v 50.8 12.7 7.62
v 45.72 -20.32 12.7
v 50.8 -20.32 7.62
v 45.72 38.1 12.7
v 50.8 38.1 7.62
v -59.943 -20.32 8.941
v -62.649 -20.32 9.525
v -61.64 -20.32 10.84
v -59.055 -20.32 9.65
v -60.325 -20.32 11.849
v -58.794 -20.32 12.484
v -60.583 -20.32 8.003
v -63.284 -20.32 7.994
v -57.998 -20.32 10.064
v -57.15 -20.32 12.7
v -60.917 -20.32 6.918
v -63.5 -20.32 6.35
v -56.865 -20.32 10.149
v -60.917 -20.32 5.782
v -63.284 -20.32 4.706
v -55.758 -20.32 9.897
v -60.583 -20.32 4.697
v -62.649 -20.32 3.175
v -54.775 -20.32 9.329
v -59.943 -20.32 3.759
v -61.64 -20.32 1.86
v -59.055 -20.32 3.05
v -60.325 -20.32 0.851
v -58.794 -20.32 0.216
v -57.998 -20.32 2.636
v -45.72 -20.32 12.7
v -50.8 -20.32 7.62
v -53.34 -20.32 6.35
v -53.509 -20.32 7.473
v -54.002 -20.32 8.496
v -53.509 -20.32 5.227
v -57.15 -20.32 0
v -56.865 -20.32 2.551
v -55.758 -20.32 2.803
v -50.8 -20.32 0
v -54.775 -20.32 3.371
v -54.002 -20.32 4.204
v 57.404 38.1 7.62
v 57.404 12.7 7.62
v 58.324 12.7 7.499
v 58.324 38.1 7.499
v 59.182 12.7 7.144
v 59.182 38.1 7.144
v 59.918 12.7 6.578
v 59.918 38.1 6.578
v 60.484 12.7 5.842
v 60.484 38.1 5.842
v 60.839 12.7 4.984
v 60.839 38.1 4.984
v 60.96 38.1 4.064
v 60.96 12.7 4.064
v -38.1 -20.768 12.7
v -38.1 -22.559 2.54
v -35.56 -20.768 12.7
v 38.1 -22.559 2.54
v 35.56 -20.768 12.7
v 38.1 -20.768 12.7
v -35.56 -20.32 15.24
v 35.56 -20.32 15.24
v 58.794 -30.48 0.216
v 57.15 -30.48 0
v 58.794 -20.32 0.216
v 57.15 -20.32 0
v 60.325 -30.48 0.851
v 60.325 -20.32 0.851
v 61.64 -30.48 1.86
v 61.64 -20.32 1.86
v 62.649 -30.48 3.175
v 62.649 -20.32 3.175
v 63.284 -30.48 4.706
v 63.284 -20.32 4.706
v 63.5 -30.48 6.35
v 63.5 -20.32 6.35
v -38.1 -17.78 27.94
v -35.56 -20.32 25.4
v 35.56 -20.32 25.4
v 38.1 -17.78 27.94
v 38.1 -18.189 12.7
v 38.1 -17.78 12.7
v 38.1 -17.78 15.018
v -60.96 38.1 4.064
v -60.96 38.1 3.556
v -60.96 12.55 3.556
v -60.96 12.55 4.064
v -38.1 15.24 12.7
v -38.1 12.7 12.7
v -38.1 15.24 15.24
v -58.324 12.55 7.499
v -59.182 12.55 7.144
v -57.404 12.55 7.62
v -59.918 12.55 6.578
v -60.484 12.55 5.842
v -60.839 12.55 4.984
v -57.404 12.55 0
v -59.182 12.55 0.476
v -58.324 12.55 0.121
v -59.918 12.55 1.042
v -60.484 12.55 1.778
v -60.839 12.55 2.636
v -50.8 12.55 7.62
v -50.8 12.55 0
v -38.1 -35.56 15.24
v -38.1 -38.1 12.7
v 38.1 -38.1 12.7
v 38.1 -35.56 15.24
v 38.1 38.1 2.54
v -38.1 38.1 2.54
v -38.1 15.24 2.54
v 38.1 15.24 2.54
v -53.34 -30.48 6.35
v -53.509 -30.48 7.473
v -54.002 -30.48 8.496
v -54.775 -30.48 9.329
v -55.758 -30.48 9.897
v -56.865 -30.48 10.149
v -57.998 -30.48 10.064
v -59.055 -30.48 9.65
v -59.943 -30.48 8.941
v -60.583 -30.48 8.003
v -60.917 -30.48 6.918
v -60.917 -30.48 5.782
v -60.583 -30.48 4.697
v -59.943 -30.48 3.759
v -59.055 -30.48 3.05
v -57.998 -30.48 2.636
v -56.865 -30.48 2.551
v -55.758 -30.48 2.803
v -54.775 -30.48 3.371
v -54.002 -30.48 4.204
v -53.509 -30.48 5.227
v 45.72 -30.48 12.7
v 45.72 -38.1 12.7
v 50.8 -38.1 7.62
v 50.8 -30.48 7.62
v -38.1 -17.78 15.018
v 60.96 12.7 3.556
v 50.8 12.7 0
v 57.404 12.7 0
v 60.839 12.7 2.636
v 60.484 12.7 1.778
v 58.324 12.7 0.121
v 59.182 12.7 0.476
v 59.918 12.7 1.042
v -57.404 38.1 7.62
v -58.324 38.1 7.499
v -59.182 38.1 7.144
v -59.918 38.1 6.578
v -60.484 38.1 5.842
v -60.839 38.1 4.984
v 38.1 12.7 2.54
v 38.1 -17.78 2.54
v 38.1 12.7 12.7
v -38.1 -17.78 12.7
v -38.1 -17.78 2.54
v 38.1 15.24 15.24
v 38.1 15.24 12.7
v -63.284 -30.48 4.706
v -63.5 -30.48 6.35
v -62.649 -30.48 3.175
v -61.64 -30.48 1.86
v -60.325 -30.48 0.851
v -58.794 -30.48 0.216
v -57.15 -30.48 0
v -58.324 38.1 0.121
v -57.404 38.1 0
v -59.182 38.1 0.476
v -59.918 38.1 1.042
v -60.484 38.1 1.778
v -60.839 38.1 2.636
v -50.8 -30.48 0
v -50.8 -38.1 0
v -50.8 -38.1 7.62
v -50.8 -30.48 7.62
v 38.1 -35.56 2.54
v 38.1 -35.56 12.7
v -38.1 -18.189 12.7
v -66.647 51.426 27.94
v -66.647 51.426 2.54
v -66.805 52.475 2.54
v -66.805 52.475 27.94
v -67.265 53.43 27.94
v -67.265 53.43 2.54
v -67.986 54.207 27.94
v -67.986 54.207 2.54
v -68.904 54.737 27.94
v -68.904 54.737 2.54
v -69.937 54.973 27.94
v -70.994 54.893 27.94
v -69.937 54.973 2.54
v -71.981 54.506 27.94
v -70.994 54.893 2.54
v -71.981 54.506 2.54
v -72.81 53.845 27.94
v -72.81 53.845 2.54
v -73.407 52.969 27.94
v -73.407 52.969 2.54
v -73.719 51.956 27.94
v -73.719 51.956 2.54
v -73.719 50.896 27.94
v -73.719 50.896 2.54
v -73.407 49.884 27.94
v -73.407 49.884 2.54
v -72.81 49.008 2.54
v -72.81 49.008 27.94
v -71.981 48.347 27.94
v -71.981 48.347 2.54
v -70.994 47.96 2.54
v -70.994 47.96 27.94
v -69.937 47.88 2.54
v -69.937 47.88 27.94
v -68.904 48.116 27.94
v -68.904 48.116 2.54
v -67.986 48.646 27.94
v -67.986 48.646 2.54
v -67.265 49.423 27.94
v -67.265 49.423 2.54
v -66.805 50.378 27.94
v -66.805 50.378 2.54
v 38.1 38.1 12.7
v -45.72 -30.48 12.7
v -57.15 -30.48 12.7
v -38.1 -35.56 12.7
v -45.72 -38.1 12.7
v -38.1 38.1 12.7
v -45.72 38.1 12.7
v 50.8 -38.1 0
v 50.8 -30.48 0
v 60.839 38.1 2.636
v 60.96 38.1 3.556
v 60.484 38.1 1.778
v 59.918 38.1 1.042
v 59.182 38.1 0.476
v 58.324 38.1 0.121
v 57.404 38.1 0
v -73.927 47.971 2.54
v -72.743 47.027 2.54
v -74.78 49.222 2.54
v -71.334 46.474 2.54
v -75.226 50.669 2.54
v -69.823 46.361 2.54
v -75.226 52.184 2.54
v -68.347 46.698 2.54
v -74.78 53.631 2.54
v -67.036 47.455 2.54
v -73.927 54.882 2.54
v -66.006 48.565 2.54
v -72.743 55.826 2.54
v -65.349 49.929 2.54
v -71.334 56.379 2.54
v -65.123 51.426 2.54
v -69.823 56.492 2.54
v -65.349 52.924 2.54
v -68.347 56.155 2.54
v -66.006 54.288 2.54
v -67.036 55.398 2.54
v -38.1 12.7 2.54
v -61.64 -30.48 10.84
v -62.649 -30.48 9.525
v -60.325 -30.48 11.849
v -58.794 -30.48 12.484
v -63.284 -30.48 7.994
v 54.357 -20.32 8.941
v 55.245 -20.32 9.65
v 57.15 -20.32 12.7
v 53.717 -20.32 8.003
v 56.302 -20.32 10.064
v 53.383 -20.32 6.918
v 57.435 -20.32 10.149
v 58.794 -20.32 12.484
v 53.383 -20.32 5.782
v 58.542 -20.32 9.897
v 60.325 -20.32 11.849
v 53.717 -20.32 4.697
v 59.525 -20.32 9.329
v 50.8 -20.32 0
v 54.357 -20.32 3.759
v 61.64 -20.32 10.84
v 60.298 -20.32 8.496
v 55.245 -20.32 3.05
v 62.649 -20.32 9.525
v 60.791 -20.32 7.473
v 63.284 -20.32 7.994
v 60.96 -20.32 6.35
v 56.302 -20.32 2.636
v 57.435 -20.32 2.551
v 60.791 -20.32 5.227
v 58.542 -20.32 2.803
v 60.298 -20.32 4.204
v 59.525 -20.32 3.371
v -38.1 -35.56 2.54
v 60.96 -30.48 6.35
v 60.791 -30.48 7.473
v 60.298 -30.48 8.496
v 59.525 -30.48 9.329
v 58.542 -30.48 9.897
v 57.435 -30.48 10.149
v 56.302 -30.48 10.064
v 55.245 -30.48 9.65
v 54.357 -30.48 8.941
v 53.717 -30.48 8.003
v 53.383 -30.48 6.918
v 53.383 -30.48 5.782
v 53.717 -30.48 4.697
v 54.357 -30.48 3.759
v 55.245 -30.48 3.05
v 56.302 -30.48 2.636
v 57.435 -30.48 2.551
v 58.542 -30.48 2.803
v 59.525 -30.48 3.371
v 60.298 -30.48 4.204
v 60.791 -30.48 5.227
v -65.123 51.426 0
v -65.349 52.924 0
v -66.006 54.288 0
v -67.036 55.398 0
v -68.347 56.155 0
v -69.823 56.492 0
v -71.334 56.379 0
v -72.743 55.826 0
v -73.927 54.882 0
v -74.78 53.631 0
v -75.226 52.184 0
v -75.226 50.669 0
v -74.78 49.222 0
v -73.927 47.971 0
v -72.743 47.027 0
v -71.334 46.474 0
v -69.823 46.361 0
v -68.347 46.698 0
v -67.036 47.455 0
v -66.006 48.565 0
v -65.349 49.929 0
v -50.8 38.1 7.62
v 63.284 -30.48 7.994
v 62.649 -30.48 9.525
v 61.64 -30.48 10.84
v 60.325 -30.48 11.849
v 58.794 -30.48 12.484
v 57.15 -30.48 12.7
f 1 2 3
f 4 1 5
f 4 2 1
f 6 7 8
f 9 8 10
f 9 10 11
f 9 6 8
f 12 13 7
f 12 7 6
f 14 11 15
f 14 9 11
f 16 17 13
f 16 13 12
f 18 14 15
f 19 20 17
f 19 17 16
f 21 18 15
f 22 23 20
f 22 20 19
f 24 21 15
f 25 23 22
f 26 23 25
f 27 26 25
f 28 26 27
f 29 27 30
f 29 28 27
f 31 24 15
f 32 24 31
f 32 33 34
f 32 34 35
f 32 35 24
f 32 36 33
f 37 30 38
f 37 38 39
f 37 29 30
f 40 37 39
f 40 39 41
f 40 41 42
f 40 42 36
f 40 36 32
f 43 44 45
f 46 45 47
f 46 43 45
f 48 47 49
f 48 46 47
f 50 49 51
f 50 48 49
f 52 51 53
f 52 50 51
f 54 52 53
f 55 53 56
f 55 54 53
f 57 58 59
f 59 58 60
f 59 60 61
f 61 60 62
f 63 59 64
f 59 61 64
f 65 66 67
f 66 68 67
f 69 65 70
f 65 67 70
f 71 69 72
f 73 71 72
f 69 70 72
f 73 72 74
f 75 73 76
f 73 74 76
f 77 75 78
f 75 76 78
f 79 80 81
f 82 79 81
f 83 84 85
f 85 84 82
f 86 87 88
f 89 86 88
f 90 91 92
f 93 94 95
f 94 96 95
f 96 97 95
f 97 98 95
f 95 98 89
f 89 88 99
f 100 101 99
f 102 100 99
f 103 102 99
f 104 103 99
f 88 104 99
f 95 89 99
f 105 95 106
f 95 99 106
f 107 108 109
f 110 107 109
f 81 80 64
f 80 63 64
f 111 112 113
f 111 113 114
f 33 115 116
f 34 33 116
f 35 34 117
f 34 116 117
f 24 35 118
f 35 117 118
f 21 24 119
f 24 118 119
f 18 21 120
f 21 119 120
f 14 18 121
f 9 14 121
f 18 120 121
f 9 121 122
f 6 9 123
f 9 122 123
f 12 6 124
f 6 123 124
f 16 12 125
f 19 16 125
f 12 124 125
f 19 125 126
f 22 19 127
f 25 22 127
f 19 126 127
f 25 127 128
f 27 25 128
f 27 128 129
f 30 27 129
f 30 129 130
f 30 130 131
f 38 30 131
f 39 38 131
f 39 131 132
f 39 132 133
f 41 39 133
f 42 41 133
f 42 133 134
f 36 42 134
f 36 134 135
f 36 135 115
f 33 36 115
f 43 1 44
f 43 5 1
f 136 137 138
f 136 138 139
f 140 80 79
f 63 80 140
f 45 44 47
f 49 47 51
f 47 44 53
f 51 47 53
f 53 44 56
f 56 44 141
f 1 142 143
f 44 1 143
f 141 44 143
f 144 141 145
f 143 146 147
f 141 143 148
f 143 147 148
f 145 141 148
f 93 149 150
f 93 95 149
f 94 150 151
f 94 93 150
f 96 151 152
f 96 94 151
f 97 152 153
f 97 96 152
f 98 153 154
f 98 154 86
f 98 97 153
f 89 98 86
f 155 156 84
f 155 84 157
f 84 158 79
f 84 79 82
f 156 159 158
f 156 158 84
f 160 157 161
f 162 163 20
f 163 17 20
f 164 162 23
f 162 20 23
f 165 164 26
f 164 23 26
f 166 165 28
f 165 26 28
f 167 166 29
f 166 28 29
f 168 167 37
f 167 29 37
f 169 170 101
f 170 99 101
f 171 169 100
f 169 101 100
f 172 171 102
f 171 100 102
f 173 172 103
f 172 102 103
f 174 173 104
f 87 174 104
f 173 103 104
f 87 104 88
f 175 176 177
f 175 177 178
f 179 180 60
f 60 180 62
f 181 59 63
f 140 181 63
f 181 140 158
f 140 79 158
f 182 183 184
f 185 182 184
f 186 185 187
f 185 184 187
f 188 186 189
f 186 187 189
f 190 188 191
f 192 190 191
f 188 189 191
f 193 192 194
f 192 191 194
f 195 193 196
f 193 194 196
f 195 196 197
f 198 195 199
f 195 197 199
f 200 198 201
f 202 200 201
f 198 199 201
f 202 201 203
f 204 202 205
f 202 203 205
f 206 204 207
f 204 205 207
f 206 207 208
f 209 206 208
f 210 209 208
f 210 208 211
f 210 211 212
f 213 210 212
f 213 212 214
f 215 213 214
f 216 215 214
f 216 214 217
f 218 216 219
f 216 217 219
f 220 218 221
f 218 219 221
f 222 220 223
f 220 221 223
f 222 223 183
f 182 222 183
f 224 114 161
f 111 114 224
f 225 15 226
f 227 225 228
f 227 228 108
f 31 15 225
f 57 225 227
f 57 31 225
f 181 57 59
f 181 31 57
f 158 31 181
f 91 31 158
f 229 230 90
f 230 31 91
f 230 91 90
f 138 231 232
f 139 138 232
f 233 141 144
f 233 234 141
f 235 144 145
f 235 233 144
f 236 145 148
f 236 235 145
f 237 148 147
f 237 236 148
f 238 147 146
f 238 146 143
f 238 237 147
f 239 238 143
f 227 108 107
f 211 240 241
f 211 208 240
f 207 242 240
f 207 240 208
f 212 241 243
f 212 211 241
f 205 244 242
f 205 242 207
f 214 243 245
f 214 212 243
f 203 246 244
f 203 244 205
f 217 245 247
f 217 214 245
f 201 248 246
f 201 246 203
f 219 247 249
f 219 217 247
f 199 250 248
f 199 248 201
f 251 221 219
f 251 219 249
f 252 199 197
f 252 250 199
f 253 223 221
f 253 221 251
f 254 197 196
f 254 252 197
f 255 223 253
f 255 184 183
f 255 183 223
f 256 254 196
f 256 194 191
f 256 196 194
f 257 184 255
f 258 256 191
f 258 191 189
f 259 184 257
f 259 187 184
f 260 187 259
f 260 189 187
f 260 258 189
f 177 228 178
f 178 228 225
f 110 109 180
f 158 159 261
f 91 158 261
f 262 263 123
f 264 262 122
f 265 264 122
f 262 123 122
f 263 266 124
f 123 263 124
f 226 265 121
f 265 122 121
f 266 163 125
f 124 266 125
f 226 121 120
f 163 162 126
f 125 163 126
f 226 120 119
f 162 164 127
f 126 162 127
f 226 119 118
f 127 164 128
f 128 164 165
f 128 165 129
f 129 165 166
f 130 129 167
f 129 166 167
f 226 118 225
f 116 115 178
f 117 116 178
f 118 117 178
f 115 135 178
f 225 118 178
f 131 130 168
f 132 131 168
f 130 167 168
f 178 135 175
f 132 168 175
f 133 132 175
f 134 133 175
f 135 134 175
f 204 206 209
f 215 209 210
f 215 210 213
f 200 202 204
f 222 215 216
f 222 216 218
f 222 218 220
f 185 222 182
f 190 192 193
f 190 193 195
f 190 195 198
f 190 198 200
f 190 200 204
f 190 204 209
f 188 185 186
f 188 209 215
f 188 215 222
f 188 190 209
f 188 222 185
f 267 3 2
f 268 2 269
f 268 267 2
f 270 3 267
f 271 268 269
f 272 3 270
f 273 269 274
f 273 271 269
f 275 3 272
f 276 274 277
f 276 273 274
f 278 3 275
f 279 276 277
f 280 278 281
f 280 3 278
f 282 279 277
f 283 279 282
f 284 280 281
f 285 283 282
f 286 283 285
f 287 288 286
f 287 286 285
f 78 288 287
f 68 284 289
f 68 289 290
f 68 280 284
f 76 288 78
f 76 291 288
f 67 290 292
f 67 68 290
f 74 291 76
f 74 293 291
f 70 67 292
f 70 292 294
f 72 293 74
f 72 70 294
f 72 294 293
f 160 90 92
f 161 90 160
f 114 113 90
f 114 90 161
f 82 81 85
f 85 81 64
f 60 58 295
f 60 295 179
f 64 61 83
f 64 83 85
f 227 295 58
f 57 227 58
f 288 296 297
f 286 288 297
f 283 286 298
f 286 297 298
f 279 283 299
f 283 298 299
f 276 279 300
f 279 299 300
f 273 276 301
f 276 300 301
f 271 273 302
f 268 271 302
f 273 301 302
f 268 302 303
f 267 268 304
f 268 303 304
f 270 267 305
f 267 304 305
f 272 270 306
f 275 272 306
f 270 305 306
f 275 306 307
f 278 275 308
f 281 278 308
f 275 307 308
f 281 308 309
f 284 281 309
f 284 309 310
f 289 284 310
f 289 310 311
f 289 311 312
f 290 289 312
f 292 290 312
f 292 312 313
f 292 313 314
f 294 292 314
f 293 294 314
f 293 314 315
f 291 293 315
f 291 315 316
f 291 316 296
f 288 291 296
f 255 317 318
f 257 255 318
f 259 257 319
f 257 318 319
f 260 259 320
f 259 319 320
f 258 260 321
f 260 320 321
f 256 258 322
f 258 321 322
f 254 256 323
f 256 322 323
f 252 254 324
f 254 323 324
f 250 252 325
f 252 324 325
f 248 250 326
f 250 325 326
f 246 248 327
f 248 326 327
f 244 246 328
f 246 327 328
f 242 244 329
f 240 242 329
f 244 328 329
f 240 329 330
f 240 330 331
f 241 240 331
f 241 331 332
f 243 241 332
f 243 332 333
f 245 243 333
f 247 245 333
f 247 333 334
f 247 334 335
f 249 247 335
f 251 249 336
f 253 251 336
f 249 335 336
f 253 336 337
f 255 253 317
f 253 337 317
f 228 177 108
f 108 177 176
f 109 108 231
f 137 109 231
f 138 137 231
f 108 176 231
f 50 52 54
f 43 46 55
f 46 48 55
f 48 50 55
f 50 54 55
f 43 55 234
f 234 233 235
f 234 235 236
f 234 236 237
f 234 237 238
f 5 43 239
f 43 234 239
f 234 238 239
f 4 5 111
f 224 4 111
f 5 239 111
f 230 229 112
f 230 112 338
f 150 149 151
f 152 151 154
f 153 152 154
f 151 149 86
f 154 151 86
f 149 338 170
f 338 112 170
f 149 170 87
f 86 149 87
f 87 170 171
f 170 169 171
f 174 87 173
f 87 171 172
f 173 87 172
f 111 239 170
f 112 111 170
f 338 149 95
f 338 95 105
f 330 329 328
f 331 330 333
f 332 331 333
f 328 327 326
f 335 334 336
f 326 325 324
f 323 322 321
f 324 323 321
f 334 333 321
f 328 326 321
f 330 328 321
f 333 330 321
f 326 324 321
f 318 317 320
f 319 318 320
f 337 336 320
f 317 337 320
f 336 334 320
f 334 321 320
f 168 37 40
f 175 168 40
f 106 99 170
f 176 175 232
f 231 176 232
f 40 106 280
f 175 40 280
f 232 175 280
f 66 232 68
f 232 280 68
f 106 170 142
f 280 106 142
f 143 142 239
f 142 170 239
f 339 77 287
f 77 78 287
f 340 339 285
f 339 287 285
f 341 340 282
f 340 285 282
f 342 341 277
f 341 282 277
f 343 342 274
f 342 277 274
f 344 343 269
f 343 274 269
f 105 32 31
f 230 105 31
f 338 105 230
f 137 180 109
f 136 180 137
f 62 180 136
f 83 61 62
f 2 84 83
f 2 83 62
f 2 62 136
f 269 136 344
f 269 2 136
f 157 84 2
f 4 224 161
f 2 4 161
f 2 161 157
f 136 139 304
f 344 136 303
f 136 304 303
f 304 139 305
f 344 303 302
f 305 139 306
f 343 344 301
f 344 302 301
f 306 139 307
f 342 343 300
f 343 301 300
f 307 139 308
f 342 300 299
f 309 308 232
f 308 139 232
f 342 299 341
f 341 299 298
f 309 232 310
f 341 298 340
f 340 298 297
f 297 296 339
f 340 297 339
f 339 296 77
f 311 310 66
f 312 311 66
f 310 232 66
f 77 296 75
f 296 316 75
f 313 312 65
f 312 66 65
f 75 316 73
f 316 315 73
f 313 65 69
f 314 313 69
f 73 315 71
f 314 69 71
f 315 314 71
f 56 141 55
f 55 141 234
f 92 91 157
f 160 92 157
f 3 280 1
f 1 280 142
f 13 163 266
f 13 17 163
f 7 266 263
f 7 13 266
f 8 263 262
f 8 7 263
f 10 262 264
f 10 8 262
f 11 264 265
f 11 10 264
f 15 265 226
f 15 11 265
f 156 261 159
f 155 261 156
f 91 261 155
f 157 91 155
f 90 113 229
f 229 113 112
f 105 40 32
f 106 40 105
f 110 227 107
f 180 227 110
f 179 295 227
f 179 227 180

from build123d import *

# Parameters (mm, degrees)
F0_W         = 101.6
F0_H         = 76.2
F1_DEPTH     = 2.54
F2_W         = 12.7
F2_H         = 10.16
F3_DEPTH     = 12.7
F4_R         = 6.34999
F5_R         = 3.81
F6_DEPTH     = 25.4
F7_W         = 12.7
F7_H         = 76.2
F8_DEPTH     = 10.16
F9_SIZE      = 5.08
F10_W        = 76.2
F10_H        = 2.54
F11_DEPTH    = 12.7
F12_DEPTH    = 12.7
F14_DEPTH    = 2.54
F15_T4_DEPTH = 76.2
F16_SIZE     = 2.53999
F17_SIZE     = 2.53999
F18_R        = 5.08
F19_DEPTH    = 2.54
F20_R        = 3.556
F21_DEPTH    = 25.4
F22_W        = 10.16
F22_H        = 25.4
F23_DEPTH    = 7.62
F24_R        = 3.556


# Not quite as in the source:
# - a fillet or chamfer that OpenCascade refuses, or shapes differently, is made with other operations: its cross-section is extruded or revolved along the edge and cut away or added
# - a fillet or chamfer is up to 0.001 mm smaller than in the source, because OpenCascade refuses the exact size


with BuildPart() as f1:
    # F0 (on Top) → F1 (new body)
    with BuildSketch(Plane.XY):
        Rectangle(F0_W, F0_H)
    extrude(amount=F1_DEPTH)

    # F2 (on Top) → F3 (join)
    with BuildSketch(Plane.XY):
        with Locations((-57.15, -25.4)):
            Rectangle(F2_W, F2_H)
        with Locations((57.15, -25.4)):
            Rectangle(F2_W, F2_H)
    extrude(amount=F3_DEPTH)

    # F4 (radius 6.35 in the source; OpenCascade refuses exactly that, so slightly less here)
    f4_edges = [f1.edges().sort_by_distance(p)[0] for p in [
        (-63.5, -25.4, 12.7),
        (-63.5, -25.4, 0),
        (63.5, -25.4, 12.7),
        (63.5, -25.4, 0),
    ]]
    fillet(f4_edges, radius=F4_R)

    # F5 (on face) → F6 (cut)
    with BuildSketch(Plane.XZ.offset(30.48)):
        with Locations((-57.15, 6.35)):
            Circle(F5_R)
        with Locations((57.15, 6.35)):
            Circle(F5_R)
    extrude(amount=-F6_DEPTH, mode=Mode.SUBTRACT)

    # F7 (on face) → F8 (join)
    with BuildSketch(Plane.XY.offset(2.54)):
        with Locations((-44.45, 0)):
            Rectangle(F7_W, F7_H)
        with Locations((44.45, 0)):
            Rectangle(F7_W, F7_H)
    extrude(amount=F8_DEPTH)

    # F9
    f9_edges = [f1.edges().sort_by_distance(p)[0] for p in [
        (-50.8, 8.89, 12.7),
        (-50.8, -34.29, 12.7),
        (50.8, 8.89, 12.7),
        (50.8, -34.29, 12.7),
    ]]
    chamfer(f9_edges, length=F9_SIZE)

    # F10 (on face) → F11 (join)
    with BuildSketch(Plane.XY.offset(2.54)):
        with Locations((0, -36.83)):
            Rectangle(F10_W, F10_H)
        with Locations((0, 13.97)):
            Rectangle(F10_W, F10_H)
        with Locations((0, -19.05)):
            Rectangle(F10_W, F10_H)
    extrude(amount=F11_DEPTH)

    # F12 (add): a face of the model
    f12_faces = [f1.faces().sort_by_distance(p)[0] for p in [
        (0, -19.05, 15.24),
    ]]
    extrude(f12_faces, amount=F12_DEPTH)

    # F13 (on face) → F14 (join)
    with BuildSketch(Plane.XZ.offset(20.32)):
        Polygon((-38.1, 12.7), (-38.1, 2.54), (38.1, 2.54), (38.1, 12.7), (38.1, 15.24), (-38.1, 15.24), align=None)
    extrude(amount=F14_DEPTH)

    # F15: chamfer of 2.54 x 14.4050558218 on 1 edges, made by hand


with BuildPart() as f15_tool2:
    # F15_s3 → F15_t4 (new body)
    with BuildSketch(Plane.YZ.offset(38.1)):
        with BuildLine():
            Line((-22.9600564677, 0.2674957519), (-20.2199435323, 15.8074484262))
            Line((-20.2199435323, 15.8074484262), (-20.2199435323, 16.0955495427))
            ThreePointArc((-20.2199435323, 16.0955495427), (-21.5399717661, 15.5281011164), (-22.86, 15.5281011164))
            Line((-22.86, 15.5281011164), (-23.1481011164, 15.24))
            ThreePointArc((-23.1481011164, 15.24), (-23.1481011164, 7.753747876), (-23.2481575841, 0.2674957519))
            Line((-23.2481575841, 0.2674957519), (-22.9600564677, 0.2674957519))
        make_face()
    extrude(amount=-F15_T4_DEPTH)

    split(bisect_by=Plane.XY.offset(2.54), keep=Keep.TOP)

    split(bisect_by=Plane.XZ.offset(20.32), keep=Keep.TOP)


with BuildPart() as f1_1:
    add(f1.part)

    # F15_t1: cut F15_tool2
    add(f15_tool2.part, mode=Mode.SUBTRACT)

    # F16 (size 2.54 in the source; OpenCascade refuses exactly that, so slightly less here)
    f16_edges = [f1_1.edges().sort_by_distance(p)[0] for p in [
        (0, -20.32, 27.94),
        (0, -38.1, 15.24),
        (0, 12.7, 15.24),
    ]]
    chamfer(f16_edges, length=F16_SIZE)

    # F17 (size 2.54 in the source; OpenCascade refuses exactly that, so slightly less here)
    f17_edges = [f1_1.edges().sort_by_distance(p)[0] for p in [
        (-38.1, -20.32, 20.320005),
        (-38.1, -20.543935, 13.97),
        (38.1, -20.32, 20.320005),
        (38.1, -20.543935, 13.97),
    ]]
    chamfer(f17_edges, length=F17_SIZE)

    # F22 (on Top) → F23 (join)
    with BuildSketch(Plane.XY):
        Polygon((-50.8, 12.7), (-50.8, 38.1), (-60.96, 38.1), (-60.96, 12.5502143055), (-50.8, 12.5502143055), align=None)
        with Locations((55.88, 25.4)):
            Rectangle(F22_W, F22_H)
    extrude(amount=F23_DEPTH)

    # F24
    f24_edges = [f1_1.edges().sort_by_distance(p)[0] for p in [
        (-60.96, 25.325107, 7.62),
        (-60.96, 25.325107, 0),
        (60.96, 25.4, 7.62),
        (60.96, 25.4, 0),
    ]]
    fillet(f24_edges, radius=F24_R)


with BuildPart() as f19:
    # F18 (on Top) → F19 (new body)
    with BuildSketch(Plane.XY):
        with Locations((-70.2030956745, 51.4264591038)):
            Circle(F18_R)
    extrude(amount=F19_DEPTH)

    # F20 (on face) → F21 (join)
    with BuildSketch(Plane.XY.offset(2.54)):
        with Locations((-70.2030956745, 51.4264591038)):
            Circle(F20_R)
    extrude(amount=F21_DEPTH)


solid = Compound([f1_1.part, f19.part])
